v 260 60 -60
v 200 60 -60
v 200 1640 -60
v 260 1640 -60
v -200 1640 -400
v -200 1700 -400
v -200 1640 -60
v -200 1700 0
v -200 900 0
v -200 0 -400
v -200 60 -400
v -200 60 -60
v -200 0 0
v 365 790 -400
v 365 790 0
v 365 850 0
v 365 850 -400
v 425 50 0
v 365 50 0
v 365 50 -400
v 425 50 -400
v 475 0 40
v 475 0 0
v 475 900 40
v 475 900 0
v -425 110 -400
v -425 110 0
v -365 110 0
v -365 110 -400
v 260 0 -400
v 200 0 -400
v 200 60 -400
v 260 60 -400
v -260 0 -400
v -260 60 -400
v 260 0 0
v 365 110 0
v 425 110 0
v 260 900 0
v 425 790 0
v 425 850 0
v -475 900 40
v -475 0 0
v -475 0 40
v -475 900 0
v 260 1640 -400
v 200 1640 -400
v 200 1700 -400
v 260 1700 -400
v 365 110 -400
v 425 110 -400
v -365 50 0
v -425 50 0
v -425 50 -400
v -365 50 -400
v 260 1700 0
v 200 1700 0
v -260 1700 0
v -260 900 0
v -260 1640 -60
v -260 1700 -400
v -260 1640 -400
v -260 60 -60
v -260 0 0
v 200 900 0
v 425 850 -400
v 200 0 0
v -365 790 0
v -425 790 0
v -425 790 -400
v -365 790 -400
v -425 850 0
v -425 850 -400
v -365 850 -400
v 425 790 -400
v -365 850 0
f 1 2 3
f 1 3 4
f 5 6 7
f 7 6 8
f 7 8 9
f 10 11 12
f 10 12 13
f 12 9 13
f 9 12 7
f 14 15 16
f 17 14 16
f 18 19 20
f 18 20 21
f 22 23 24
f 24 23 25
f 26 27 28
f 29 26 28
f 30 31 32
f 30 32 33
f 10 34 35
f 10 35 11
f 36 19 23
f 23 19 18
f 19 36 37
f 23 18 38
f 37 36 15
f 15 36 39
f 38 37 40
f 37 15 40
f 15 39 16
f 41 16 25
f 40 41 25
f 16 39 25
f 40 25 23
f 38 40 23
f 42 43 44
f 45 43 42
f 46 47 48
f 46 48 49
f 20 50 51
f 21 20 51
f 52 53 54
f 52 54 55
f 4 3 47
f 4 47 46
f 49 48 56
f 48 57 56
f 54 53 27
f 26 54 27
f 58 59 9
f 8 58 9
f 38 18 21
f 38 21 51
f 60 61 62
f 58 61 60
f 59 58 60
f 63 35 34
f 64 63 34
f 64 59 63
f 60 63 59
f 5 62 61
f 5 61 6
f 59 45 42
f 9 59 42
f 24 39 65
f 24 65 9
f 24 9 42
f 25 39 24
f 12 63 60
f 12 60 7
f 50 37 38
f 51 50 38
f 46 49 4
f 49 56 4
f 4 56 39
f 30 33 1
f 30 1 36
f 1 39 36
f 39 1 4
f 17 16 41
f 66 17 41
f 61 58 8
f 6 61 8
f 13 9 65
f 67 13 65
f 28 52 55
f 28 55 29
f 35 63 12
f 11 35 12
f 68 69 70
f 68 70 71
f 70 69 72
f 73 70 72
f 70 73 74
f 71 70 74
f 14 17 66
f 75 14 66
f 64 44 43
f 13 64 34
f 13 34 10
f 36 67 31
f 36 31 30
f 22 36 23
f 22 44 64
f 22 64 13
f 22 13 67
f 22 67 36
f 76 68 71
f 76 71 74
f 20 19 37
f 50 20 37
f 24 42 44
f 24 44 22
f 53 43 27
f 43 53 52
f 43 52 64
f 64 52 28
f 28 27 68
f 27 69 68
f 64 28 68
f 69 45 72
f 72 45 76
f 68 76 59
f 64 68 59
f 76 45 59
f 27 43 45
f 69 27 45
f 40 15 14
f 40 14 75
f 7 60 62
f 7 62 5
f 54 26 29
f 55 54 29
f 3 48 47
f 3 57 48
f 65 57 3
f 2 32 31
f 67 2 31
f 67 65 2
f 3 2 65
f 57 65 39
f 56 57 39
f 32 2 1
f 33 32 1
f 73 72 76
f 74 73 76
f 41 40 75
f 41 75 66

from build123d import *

# Parameters (mm, degrees)
F0_W     = 950
F0_H     = 900
F0_W_2   = 60
F0_H_2   = 60
F1_DEPTH = 40
F2_DEPTH = 400
F3_W     = 60
F3_H     = 1700
F4_DEPTH = 60
F5_DEPTH = 60
F6_W     = 60
F6_H     = 60
F7_DEPTH = 340


# Not quite as in the source:
# - a feature names something its author has since deleted; it is built from what else it names


with BuildPart() as f1:
    # F0 (on Top) → F1 (new body)
    with BuildSketch(Plane.XY):
        with Locations((0, 450)):
            Rectangle(F0_W, F0_H)
        with Locations((-395, 80)):
            Rectangle(F0_W_2, F0_H_2, mode=Mode.SUBTRACT)
        with Locations((395, 80)):
            Rectangle(F0_W_2, F0_H_2, mode=Mode.SUBTRACT)
        with Locations((-395, 820)):
            Rectangle(F0_W_2, F0_H_2, mode=Mode.SUBTRACT)
        with Locations((395, 820)):
            Rectangle(F0_W_2, F0_H_2, mode=Mode.SUBTRACT)
        with Locations((-395, 80)):
            Rectangle(F0_W_2, F0_H_2)
        with Locations((-395, 820)):
            Rectangle(F0_W_2, F0_H_2)
        with Locations((395, 80)):
            Rectangle(F0_W_2, F0_H_2)
        with Locations((395, 820)):
            Rectangle(F0_W_2, F0_H_2)
    extrude(amount=F1_DEPTH)

    # F0 (on Top) → F2 (join)
    with BuildSketch(Plane.XY):
        with Locations((-395, 80)):
            Rectangle(F0_W_2, F0_H_2)
        with Locations((-395, 820)):
            Rectangle(F0_W_2, F0_H_2)
        with Locations((395, 80)):
            Rectangle(F0_W_2, F0_H_2)
        with Locations((395, 820)):
            Rectangle(F0_W_2, F0_H_2)
    extrude(amount=-F2_DEPTH)

    # F3 (on face) → F4 (join)
    with BuildSketch(Plane(origin=(0, 0, 0), x_dir=(1, 0, 0), z_dir=(0, 0, -1))):
        with Locations((-230, -850)):
            Rectangle(F3_W, F3_H)
        with Locations((230, -850)):
            Rectangle(F3_W, F3_H)
    extrude(amount=F4_DEPTH)

    # F3 (on face) → F5 (join)
    with BuildSketch(Plane(origin=(0, 0, 0), x_dir=(1, 0, 0), z_dir=(0, 0, -1))):
        with Locations((-230, -850)):
            Rectangle(F3_W, F3_H)
        with Locations((230, -850)):
            Rectangle(F3_W, F3_H)
    extrude(amount=F5_DEPTH)

    # F6 (on face) → F7 (join)
    with BuildSketch(Plane(origin=(0, 0, -60), x_dir=(1, 0, 0), z_dir=(0, 0, -1))):
        with Locations((230, -1670)):
            Rectangle(F6_W, F6_H)
        with Locations((-230, -1670)):
            Rectangle(F6_W, F6_H)
        with Locations((-230, -30)):
            Rectangle(F6_W, F6_H)
        with Locations((230, -30)):
            Rectangle(F6_W, F6_H)
    extrude(amount=F7_DEPTH)


solid = f1.part
